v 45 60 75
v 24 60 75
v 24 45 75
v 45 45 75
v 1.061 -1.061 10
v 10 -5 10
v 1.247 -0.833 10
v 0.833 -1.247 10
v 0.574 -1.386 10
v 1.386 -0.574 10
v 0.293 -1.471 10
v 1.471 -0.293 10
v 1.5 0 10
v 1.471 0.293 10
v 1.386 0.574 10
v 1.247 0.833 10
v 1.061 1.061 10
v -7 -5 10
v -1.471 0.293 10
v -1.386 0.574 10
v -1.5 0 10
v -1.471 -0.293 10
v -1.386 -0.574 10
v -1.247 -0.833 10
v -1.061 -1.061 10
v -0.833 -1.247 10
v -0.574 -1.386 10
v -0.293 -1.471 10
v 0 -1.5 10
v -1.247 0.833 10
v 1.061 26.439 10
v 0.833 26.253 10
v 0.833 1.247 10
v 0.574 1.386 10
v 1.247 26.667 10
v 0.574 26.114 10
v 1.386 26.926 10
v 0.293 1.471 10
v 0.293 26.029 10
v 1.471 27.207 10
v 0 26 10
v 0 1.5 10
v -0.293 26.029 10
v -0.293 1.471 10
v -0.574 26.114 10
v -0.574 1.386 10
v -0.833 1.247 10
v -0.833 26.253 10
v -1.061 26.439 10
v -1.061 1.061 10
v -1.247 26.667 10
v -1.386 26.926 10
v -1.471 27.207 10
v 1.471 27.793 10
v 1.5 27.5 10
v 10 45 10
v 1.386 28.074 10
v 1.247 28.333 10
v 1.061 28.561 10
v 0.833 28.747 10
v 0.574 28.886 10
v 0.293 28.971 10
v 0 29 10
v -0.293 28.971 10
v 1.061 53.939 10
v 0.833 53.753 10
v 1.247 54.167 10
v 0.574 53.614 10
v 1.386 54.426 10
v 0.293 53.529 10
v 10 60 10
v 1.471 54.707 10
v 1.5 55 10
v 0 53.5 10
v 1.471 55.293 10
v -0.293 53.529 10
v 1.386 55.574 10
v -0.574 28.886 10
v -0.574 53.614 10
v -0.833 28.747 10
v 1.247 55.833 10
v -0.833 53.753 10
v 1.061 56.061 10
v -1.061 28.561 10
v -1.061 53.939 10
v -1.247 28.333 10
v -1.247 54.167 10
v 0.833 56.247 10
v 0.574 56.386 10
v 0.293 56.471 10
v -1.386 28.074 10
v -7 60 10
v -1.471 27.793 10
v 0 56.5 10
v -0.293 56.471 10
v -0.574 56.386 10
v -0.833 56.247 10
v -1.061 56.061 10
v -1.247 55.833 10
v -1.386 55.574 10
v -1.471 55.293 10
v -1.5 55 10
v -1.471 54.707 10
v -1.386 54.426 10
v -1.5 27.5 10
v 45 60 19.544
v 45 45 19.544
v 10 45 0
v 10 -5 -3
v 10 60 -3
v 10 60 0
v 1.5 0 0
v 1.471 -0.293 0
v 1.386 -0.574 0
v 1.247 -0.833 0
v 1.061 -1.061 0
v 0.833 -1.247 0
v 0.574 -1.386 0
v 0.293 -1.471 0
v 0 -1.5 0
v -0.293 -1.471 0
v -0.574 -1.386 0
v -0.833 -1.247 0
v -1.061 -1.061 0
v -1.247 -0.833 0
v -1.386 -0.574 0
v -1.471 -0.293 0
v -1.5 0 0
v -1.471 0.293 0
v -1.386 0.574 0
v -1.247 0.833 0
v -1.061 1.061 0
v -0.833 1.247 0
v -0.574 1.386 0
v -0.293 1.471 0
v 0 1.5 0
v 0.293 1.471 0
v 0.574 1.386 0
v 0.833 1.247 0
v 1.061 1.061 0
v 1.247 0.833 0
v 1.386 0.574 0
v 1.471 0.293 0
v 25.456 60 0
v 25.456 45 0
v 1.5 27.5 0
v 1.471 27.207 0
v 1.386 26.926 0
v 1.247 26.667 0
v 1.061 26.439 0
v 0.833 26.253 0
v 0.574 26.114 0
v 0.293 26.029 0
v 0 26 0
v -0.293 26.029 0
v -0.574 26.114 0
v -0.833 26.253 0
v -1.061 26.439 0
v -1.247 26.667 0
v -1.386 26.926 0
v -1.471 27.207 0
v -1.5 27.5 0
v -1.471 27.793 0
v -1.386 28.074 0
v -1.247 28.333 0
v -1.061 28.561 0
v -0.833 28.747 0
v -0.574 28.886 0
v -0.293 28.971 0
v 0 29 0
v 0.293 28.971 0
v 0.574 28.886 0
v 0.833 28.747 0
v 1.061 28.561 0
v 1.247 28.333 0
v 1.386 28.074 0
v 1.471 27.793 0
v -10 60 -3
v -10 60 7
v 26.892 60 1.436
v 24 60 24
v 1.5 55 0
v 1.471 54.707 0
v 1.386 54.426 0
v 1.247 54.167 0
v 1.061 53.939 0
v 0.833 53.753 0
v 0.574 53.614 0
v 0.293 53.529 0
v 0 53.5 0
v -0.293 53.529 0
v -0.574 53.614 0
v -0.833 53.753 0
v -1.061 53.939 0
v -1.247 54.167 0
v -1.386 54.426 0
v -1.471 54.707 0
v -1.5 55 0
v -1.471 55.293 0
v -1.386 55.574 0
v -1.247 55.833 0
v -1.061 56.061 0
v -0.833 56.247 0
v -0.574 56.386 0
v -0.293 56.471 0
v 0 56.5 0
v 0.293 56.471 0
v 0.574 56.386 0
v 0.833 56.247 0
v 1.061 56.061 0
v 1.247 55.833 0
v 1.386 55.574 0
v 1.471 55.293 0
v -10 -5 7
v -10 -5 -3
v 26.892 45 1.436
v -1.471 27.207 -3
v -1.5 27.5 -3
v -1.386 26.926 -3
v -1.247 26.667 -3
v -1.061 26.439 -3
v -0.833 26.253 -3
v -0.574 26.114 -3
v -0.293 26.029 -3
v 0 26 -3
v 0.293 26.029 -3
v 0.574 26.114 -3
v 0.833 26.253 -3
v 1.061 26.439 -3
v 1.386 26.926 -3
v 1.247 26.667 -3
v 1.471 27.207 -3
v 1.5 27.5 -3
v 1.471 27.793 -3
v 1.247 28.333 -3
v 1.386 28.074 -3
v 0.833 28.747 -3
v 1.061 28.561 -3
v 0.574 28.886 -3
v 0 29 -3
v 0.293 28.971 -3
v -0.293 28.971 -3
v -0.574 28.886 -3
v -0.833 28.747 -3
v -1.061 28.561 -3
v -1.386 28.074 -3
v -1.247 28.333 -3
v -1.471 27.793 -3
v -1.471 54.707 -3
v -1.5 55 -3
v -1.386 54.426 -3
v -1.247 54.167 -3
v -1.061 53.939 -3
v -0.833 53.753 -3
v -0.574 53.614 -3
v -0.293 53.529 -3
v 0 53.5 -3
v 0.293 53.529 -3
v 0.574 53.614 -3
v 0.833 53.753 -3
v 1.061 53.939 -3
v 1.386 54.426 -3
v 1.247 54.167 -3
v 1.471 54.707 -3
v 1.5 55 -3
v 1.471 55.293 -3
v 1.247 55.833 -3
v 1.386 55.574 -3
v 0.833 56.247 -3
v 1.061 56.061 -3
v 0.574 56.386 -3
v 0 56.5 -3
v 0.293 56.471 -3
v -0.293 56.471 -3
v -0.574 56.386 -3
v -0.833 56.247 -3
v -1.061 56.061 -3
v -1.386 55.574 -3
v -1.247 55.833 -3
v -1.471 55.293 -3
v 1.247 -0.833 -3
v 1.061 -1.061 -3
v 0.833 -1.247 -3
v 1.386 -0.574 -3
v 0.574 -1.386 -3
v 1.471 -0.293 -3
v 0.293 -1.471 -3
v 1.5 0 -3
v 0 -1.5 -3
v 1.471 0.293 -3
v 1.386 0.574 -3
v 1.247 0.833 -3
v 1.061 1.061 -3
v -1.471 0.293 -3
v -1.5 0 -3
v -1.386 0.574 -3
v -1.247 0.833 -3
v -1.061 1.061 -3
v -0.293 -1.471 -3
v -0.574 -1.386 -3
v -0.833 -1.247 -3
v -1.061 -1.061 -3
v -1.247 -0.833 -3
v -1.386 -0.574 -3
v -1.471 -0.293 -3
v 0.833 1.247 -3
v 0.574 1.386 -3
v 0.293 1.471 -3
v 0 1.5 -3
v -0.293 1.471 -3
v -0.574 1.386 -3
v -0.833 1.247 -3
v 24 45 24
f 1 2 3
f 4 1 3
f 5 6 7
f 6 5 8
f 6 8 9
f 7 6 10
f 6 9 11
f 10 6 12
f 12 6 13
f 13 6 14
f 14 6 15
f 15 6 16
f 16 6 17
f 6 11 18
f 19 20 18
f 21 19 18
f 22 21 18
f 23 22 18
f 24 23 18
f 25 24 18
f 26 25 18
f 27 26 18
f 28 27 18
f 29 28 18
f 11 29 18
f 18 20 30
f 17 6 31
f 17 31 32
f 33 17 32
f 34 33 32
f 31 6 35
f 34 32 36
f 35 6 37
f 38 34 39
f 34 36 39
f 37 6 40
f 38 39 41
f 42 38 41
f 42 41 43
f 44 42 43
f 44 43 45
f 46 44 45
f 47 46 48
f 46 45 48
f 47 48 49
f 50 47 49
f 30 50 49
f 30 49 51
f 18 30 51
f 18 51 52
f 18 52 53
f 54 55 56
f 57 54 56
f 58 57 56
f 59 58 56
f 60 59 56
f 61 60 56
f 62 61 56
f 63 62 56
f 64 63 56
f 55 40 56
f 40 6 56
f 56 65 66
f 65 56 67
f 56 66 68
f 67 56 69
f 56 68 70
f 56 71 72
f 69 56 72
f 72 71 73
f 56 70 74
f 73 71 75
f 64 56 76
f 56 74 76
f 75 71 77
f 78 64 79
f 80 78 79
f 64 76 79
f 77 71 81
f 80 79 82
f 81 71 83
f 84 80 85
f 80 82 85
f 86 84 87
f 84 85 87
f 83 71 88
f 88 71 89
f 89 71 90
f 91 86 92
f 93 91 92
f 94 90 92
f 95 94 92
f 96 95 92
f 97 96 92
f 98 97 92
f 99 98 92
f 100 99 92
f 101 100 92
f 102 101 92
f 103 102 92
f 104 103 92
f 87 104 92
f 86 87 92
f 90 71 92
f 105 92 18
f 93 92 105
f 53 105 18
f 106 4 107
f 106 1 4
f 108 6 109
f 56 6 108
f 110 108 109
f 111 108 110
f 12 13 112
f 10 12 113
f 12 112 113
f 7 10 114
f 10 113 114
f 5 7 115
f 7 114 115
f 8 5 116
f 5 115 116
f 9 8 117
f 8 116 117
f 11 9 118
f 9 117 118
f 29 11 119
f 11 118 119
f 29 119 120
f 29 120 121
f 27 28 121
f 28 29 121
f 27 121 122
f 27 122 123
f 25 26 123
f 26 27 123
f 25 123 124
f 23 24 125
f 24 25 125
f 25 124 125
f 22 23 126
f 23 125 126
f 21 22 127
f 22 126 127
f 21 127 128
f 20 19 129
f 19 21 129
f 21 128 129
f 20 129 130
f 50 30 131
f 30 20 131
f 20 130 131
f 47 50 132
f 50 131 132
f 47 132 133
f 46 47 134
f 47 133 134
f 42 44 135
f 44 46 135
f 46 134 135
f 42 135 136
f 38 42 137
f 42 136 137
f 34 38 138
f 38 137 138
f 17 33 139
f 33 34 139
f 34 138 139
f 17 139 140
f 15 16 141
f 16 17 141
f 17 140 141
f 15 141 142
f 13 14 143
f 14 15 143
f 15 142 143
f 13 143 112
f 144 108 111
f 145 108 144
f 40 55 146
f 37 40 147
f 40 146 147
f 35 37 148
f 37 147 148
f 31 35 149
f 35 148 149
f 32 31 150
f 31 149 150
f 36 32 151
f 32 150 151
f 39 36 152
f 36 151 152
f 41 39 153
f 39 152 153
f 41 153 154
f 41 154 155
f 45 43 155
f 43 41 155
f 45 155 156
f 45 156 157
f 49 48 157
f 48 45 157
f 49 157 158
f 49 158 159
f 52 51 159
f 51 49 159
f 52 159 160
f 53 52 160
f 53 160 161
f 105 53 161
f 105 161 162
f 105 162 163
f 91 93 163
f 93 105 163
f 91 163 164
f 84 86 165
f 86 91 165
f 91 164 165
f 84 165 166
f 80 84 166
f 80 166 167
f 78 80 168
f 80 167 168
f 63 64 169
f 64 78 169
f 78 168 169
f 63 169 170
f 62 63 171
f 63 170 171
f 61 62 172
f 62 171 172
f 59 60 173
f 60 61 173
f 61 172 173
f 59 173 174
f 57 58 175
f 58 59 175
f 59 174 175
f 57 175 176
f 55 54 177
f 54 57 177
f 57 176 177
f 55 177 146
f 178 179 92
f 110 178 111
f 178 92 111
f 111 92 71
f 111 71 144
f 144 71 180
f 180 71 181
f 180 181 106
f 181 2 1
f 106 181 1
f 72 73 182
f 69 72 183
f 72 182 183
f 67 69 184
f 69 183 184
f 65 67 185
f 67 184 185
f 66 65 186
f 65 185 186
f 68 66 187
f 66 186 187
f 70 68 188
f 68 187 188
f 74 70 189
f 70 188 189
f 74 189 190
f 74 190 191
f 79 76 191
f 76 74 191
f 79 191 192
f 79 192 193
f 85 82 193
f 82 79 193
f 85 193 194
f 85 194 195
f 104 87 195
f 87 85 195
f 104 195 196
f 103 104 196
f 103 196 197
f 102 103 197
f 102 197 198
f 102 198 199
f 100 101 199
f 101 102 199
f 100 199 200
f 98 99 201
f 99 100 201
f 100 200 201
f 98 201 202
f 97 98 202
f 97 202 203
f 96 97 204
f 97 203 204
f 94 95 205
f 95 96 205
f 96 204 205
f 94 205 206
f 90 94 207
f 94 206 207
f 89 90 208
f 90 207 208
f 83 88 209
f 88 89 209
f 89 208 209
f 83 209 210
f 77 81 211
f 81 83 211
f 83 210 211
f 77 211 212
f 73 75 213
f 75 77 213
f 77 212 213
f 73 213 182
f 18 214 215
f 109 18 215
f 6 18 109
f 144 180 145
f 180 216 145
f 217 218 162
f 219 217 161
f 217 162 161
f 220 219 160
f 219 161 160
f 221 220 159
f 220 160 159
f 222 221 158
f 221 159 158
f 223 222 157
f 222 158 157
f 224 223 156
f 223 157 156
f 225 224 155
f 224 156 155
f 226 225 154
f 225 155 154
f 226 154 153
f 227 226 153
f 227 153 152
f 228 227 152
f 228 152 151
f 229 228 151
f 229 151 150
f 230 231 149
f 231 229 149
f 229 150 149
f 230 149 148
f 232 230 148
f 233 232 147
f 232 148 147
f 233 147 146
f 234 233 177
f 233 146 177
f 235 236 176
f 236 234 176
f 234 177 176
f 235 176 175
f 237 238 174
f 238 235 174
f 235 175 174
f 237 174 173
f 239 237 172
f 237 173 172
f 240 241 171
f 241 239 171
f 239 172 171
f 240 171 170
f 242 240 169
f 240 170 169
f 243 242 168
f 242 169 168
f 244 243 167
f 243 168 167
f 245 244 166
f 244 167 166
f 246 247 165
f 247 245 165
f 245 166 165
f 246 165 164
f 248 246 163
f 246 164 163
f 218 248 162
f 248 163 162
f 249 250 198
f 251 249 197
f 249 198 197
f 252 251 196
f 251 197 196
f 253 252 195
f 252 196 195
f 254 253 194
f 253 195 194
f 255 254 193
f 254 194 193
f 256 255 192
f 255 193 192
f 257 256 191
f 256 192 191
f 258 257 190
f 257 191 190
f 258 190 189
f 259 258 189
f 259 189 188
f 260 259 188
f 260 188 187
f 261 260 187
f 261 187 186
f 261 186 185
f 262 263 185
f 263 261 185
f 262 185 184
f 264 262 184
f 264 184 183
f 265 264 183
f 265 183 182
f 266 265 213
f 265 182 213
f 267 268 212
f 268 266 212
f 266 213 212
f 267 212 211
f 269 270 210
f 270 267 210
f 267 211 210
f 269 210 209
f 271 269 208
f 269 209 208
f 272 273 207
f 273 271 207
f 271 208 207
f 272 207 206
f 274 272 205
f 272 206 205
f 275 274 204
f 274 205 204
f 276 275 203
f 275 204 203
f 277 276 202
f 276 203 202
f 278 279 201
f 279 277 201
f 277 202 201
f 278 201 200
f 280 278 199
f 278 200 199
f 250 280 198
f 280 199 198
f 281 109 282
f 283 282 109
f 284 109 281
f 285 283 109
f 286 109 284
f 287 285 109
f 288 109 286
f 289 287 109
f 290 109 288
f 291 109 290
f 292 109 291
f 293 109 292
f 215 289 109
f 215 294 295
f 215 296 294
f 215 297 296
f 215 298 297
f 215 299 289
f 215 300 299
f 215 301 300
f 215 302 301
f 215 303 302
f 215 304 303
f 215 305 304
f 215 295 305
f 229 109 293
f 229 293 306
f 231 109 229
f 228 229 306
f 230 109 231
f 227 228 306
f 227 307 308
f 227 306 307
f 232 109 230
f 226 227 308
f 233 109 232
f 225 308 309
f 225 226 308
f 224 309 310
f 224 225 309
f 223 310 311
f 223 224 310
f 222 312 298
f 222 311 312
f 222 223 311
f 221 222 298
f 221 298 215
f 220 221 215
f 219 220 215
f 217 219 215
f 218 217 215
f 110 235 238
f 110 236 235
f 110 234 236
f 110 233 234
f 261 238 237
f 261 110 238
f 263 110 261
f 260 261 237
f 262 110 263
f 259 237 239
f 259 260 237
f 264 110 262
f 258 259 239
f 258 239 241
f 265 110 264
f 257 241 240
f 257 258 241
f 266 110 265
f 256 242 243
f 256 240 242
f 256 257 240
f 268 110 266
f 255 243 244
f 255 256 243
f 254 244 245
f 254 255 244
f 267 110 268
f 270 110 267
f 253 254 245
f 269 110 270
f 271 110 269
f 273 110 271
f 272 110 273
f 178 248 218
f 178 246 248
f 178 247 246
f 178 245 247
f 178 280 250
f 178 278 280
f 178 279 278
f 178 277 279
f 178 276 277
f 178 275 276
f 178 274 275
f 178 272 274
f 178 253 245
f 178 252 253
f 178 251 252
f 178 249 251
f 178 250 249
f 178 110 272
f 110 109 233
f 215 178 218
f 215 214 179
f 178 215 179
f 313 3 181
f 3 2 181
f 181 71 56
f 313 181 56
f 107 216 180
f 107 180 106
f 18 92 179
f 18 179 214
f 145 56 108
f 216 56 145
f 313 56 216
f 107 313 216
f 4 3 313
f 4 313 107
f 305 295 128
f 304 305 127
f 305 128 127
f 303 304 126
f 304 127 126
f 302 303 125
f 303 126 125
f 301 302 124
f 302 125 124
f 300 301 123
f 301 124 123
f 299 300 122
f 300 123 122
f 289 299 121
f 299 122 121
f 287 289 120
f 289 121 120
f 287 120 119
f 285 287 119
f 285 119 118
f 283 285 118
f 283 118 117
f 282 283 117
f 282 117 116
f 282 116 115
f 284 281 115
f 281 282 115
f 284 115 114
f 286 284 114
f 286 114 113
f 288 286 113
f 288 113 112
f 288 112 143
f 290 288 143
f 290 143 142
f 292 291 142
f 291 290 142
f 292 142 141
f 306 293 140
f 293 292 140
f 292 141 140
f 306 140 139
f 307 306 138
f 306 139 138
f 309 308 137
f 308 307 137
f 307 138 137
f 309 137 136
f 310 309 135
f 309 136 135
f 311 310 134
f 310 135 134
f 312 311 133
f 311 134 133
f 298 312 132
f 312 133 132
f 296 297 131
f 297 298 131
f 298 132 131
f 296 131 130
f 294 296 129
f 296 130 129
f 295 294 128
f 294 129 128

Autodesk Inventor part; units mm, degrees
ref_plane "YZ Plane" through (0, 0, 0) normal (1, 0, 0) x (0, 1, 0)
ref_plane "XZ Plane" through (0, 0, 0) normal (0, 1, 0) x (-1, 0, 0)
ref_plane "XY Plane" through (0, 0, 0) normal (0, 0, 1) x (1, 0, 0)
sketch "Sketch9" plane through (0, 0, 0) normal (0, 0, 1) x (1, 0, 0)
  line L0 (0, 0) -> (0, 55) construction
  circle A0 centre (0, 55) radius 1.5
  circle A1 centre (0, 0) radius 1.5
  circle A2 centre (0, 27.5) radius 1.5
  line L1 (-10, 60) -> (10, 60)
  line L2 (10, 60) -> (10, -5)
  line L3 (10, -5) -> (-10, -5)
  line L4 (-10, -5) -> (-10, 60)
  point P0 (-10, 27.5)
  point P1 (0, 60)
  dimension "d35" = 55
  dimension "d36" = 3
  dimension "d37" = 3
  dimension "d38" = 3
  dimension "d39" = 5
  dimension "d40" = 10
extrude "Extrusion9" add sketch "Sketch9" along normal blind 10
sketch "Sketch11" plane through (10, -5, 0) normal (1, 0, 0) x (0, 0, -1)
  line L0 (0, 65) -> (-10, 65) projected
  line L1 (0, 65) -> (-75, 65)
  line L2 (-75, 65) -> (-75, 50)
  line L3 (-75, 50) -> (0, 50)
  line L4 (0, 50) -> (0, 65)
  point P0 (0, 5)
  dimension "d43" = 15
  dimension "d44" = 75
extrude "Extrusion10" add sketch "Sketch11" along normal blind 35
sketch "Sketch12" plane through (-10, 60, 10) normal (0, 1, 0) x (1, 0, 0)
  line L0 (20, -65) -> (20, 0) projected
  line L1 (20, -65) -> (34, -65)
  line L2 (34, -65) -> (34, 0)
  line L3 (34, 0) -> (20, 0)
  line L4 (20, 0) -> (20, -65)
  point P0 (10, 10)
  dimension "d47" = 14
extrude "Extrusion11" cut sketch "Sketch12" against normal through all
chamfer "Chamfer6" distance 14 angle 45 1 edges at (24, 52.5, 10)
sketch "Sketch14" plane through (10, 45, 0) normal (0, -1, 0) x (1, 0, 0)
  line L0 (0, 10) -> (14, 24) projected
  line L1 (15.4558, 0) -> (35, 19.5442)
  line L2 (35, 75) -> (35, 0) projected
  line L3 (0, 0) -> (35, 0) projected
  line L4 (15.4558, 0) -> (35, 0)
  line L5 (35, 19.5442) -> (35, 0)
  point P0 (-10, 0)
  dimension "d73" = 18
extrude "Extrusion13" cut sketch "Sketch14" against normal through all
sketch "Sketch15" plane through (0, 0, 0) normal (0, 0, -1) x (-1, 0, 0)
  line L0 (-25.4558, 60) -> (-25.4558, 45) projected
  line L1 (-10, 45) -> (-25.4558, 45) projected
  line L2 (-10, 45) -> (-10, -5) projected
  line L3 (-10, -5) -> (10, -5) projected
  line L4 (10, -5) -> (10, 60) projected
  line L5 (10, 60) -> (-25.4558, 60) projected
  circle A0 centre (0, 55) radius 1.5 projected
  circle A1 centre (0, 0) radius 1.5 projected
  circle A2 centre (0, 27.5) radius 1.5 projected
  line L6 (-10, -5) -> (10, -5) projected
  line L7 (10, 60) -> (-10, 60) projected
  line L8 (-10, -5) -> (-10, 60)
  line L9 (-10, 60) -> (10, 60)
extrude "Extrusion14" add sketch "Sketch15" along normal blind 3 contours L5 L4 L3 L2 L8
chamfer "Chamfer8" distance 3 angle 45 1 edges at (-10, 27.5, 10)
sketch "Sketch17" plane through (-10, -5, -3) normal (0, -1, 0) x (1, 0, 0)
  line L0 (20, 3) -> (20, 13) projected
  line L1 (20, 3) -> (35.4558, 3) projected
  line L2 (20, 3) -> (35.4558, 3)
  line L3 (35.4558, 3) -> (37.5981, 1.5)
  line L4 (37.5981, 1.5) -> (49, 1.5)
  line L5 (49, 3.5) -> (38.2287, 3.5)
  line L6 (38.2287, 3.5) -> (36.0864, 5)
  line L7 (36.0864, 5) -> (20, 5)
  line L8 (20, 3) -> (20, 5)
  line L9 (49, 3.5) -> (49, 1.5)
  line L10 (55, 78) -> (55, 22.5442) projected
  point P0 (10, 3)
  dimension "d83" = 145
  dimension "d84" = 2
  dimension "d87" = 1.5
  dimension "d88" = 6
extrude "Extrusion16" add sketch "Sketch17" against normal blind 65
sketch "Sketch18" plane through (24, 45, 75) normal (0, -1, 0) x (1, 0, 0)
  line L0 (-34, -68) -> (-31, -65) projected
  line L1 (-34, -68) -> (-34, -78) projected
  line L2 (-14, -78) -> (-34, -78) projected
  line L3 (-14, -75) -> (-14, -78) projected
  line L4 (-14, -75) -> (1.4558, -75) projected
  line L5 (1.4558, -75) -> (3.5981, -76.5) projected
  line L6 (3.5981, -76.5) -> (15, -76.5) projected
  line L7 (15, -76.5) -> (15, -74.5) projected
  line L8 (15, -74.5) -> (4.2287, -74.5) projected
  line L9 (4.2287, -74.5) -> (2.0864, -73) projected
  line L10 (2.0864, -73) -> (-14, -73) projected
  line L11 (-14, -65) -> (-14, -73) projected
  line L12 (-31, -65) -> (-14, -65) projected
  line L13 (2.8919, -73.564) -> (4.2287, -74.5) projected
  line L14 (2.8919, -73.564) -> (1.4558, -75)
  point P0 (-24, -75)
extrude "Extrusion17" cut sketch "Sketch18" against normal through all contours L14 L9 L8 L7 L6 L5
sketch "Sketch19" plane through (-10, -5, -3) normal (0, -1, 0) x (1, 0, 0)
  line L0 (0, 10) -> (3, 13) projected
  line L1 (0, 10) -> (0, 0) projected
  line L2 (20, 0) -> (0, 0) projected
  line L3 (20, 3) -> (20, 0) projected
  line L4 (20, 3) -> (35.4558, 3) projected
  line L5 (35.4558, 3) -> (37.5981, 1.5) projected
  line L6 (37.5981, 1.5) -> (49, 1.5) projected
  line L7 (49, 1.5) -> (49, 3.5) projected
  line L8 (49, 3.5) -> (38.2287, 3.5) projected
  line L9 (38.2287, 3.5) -> (36.0864, 5) projected
  line L10 (36.0864, 5) -> (20, 5) projected
  line L11 (20, 13) -> (20, 5) projected
  line L12 (3, 13) -> (20, 13) projected
  line L13 (20, 5) -> (20, 3)
  point P0 (10, 3)
extrude "Extrusion18" cut sketch "Sketch19" against normal blind 50 contours L10 L9 L8 L7 L6 L5 L4 L13
equation "\"Module\" = 2"
equation "\"PressureAngle\" = 20deg"
equation "\"UnitProfileClearance\" = 0.25"
equation "\"UnitRoundRadius\" = 0.35"
equation "\"HeadDiameter\" = 42"
equation "\"RootDiameter\" = 33"
equation "\"BaseDiameter\" = 35.70832"
equation "\"PitchDiameter\" = 38"
equation "\"HelixAngle\" = 0"
equation "\"UnitCorrection\" = 0"
equation "\"UnitAddendumModification\" = 0"
equation "\"CircularPitch\" = 6.283185"
equation "\"UnitBacklashShift\" = 0"
equation "\"TotalToolShift\" = 0"
equation "\"IsInternal\" = 0"
properties part number "GA04" material "ABS Plastic"
